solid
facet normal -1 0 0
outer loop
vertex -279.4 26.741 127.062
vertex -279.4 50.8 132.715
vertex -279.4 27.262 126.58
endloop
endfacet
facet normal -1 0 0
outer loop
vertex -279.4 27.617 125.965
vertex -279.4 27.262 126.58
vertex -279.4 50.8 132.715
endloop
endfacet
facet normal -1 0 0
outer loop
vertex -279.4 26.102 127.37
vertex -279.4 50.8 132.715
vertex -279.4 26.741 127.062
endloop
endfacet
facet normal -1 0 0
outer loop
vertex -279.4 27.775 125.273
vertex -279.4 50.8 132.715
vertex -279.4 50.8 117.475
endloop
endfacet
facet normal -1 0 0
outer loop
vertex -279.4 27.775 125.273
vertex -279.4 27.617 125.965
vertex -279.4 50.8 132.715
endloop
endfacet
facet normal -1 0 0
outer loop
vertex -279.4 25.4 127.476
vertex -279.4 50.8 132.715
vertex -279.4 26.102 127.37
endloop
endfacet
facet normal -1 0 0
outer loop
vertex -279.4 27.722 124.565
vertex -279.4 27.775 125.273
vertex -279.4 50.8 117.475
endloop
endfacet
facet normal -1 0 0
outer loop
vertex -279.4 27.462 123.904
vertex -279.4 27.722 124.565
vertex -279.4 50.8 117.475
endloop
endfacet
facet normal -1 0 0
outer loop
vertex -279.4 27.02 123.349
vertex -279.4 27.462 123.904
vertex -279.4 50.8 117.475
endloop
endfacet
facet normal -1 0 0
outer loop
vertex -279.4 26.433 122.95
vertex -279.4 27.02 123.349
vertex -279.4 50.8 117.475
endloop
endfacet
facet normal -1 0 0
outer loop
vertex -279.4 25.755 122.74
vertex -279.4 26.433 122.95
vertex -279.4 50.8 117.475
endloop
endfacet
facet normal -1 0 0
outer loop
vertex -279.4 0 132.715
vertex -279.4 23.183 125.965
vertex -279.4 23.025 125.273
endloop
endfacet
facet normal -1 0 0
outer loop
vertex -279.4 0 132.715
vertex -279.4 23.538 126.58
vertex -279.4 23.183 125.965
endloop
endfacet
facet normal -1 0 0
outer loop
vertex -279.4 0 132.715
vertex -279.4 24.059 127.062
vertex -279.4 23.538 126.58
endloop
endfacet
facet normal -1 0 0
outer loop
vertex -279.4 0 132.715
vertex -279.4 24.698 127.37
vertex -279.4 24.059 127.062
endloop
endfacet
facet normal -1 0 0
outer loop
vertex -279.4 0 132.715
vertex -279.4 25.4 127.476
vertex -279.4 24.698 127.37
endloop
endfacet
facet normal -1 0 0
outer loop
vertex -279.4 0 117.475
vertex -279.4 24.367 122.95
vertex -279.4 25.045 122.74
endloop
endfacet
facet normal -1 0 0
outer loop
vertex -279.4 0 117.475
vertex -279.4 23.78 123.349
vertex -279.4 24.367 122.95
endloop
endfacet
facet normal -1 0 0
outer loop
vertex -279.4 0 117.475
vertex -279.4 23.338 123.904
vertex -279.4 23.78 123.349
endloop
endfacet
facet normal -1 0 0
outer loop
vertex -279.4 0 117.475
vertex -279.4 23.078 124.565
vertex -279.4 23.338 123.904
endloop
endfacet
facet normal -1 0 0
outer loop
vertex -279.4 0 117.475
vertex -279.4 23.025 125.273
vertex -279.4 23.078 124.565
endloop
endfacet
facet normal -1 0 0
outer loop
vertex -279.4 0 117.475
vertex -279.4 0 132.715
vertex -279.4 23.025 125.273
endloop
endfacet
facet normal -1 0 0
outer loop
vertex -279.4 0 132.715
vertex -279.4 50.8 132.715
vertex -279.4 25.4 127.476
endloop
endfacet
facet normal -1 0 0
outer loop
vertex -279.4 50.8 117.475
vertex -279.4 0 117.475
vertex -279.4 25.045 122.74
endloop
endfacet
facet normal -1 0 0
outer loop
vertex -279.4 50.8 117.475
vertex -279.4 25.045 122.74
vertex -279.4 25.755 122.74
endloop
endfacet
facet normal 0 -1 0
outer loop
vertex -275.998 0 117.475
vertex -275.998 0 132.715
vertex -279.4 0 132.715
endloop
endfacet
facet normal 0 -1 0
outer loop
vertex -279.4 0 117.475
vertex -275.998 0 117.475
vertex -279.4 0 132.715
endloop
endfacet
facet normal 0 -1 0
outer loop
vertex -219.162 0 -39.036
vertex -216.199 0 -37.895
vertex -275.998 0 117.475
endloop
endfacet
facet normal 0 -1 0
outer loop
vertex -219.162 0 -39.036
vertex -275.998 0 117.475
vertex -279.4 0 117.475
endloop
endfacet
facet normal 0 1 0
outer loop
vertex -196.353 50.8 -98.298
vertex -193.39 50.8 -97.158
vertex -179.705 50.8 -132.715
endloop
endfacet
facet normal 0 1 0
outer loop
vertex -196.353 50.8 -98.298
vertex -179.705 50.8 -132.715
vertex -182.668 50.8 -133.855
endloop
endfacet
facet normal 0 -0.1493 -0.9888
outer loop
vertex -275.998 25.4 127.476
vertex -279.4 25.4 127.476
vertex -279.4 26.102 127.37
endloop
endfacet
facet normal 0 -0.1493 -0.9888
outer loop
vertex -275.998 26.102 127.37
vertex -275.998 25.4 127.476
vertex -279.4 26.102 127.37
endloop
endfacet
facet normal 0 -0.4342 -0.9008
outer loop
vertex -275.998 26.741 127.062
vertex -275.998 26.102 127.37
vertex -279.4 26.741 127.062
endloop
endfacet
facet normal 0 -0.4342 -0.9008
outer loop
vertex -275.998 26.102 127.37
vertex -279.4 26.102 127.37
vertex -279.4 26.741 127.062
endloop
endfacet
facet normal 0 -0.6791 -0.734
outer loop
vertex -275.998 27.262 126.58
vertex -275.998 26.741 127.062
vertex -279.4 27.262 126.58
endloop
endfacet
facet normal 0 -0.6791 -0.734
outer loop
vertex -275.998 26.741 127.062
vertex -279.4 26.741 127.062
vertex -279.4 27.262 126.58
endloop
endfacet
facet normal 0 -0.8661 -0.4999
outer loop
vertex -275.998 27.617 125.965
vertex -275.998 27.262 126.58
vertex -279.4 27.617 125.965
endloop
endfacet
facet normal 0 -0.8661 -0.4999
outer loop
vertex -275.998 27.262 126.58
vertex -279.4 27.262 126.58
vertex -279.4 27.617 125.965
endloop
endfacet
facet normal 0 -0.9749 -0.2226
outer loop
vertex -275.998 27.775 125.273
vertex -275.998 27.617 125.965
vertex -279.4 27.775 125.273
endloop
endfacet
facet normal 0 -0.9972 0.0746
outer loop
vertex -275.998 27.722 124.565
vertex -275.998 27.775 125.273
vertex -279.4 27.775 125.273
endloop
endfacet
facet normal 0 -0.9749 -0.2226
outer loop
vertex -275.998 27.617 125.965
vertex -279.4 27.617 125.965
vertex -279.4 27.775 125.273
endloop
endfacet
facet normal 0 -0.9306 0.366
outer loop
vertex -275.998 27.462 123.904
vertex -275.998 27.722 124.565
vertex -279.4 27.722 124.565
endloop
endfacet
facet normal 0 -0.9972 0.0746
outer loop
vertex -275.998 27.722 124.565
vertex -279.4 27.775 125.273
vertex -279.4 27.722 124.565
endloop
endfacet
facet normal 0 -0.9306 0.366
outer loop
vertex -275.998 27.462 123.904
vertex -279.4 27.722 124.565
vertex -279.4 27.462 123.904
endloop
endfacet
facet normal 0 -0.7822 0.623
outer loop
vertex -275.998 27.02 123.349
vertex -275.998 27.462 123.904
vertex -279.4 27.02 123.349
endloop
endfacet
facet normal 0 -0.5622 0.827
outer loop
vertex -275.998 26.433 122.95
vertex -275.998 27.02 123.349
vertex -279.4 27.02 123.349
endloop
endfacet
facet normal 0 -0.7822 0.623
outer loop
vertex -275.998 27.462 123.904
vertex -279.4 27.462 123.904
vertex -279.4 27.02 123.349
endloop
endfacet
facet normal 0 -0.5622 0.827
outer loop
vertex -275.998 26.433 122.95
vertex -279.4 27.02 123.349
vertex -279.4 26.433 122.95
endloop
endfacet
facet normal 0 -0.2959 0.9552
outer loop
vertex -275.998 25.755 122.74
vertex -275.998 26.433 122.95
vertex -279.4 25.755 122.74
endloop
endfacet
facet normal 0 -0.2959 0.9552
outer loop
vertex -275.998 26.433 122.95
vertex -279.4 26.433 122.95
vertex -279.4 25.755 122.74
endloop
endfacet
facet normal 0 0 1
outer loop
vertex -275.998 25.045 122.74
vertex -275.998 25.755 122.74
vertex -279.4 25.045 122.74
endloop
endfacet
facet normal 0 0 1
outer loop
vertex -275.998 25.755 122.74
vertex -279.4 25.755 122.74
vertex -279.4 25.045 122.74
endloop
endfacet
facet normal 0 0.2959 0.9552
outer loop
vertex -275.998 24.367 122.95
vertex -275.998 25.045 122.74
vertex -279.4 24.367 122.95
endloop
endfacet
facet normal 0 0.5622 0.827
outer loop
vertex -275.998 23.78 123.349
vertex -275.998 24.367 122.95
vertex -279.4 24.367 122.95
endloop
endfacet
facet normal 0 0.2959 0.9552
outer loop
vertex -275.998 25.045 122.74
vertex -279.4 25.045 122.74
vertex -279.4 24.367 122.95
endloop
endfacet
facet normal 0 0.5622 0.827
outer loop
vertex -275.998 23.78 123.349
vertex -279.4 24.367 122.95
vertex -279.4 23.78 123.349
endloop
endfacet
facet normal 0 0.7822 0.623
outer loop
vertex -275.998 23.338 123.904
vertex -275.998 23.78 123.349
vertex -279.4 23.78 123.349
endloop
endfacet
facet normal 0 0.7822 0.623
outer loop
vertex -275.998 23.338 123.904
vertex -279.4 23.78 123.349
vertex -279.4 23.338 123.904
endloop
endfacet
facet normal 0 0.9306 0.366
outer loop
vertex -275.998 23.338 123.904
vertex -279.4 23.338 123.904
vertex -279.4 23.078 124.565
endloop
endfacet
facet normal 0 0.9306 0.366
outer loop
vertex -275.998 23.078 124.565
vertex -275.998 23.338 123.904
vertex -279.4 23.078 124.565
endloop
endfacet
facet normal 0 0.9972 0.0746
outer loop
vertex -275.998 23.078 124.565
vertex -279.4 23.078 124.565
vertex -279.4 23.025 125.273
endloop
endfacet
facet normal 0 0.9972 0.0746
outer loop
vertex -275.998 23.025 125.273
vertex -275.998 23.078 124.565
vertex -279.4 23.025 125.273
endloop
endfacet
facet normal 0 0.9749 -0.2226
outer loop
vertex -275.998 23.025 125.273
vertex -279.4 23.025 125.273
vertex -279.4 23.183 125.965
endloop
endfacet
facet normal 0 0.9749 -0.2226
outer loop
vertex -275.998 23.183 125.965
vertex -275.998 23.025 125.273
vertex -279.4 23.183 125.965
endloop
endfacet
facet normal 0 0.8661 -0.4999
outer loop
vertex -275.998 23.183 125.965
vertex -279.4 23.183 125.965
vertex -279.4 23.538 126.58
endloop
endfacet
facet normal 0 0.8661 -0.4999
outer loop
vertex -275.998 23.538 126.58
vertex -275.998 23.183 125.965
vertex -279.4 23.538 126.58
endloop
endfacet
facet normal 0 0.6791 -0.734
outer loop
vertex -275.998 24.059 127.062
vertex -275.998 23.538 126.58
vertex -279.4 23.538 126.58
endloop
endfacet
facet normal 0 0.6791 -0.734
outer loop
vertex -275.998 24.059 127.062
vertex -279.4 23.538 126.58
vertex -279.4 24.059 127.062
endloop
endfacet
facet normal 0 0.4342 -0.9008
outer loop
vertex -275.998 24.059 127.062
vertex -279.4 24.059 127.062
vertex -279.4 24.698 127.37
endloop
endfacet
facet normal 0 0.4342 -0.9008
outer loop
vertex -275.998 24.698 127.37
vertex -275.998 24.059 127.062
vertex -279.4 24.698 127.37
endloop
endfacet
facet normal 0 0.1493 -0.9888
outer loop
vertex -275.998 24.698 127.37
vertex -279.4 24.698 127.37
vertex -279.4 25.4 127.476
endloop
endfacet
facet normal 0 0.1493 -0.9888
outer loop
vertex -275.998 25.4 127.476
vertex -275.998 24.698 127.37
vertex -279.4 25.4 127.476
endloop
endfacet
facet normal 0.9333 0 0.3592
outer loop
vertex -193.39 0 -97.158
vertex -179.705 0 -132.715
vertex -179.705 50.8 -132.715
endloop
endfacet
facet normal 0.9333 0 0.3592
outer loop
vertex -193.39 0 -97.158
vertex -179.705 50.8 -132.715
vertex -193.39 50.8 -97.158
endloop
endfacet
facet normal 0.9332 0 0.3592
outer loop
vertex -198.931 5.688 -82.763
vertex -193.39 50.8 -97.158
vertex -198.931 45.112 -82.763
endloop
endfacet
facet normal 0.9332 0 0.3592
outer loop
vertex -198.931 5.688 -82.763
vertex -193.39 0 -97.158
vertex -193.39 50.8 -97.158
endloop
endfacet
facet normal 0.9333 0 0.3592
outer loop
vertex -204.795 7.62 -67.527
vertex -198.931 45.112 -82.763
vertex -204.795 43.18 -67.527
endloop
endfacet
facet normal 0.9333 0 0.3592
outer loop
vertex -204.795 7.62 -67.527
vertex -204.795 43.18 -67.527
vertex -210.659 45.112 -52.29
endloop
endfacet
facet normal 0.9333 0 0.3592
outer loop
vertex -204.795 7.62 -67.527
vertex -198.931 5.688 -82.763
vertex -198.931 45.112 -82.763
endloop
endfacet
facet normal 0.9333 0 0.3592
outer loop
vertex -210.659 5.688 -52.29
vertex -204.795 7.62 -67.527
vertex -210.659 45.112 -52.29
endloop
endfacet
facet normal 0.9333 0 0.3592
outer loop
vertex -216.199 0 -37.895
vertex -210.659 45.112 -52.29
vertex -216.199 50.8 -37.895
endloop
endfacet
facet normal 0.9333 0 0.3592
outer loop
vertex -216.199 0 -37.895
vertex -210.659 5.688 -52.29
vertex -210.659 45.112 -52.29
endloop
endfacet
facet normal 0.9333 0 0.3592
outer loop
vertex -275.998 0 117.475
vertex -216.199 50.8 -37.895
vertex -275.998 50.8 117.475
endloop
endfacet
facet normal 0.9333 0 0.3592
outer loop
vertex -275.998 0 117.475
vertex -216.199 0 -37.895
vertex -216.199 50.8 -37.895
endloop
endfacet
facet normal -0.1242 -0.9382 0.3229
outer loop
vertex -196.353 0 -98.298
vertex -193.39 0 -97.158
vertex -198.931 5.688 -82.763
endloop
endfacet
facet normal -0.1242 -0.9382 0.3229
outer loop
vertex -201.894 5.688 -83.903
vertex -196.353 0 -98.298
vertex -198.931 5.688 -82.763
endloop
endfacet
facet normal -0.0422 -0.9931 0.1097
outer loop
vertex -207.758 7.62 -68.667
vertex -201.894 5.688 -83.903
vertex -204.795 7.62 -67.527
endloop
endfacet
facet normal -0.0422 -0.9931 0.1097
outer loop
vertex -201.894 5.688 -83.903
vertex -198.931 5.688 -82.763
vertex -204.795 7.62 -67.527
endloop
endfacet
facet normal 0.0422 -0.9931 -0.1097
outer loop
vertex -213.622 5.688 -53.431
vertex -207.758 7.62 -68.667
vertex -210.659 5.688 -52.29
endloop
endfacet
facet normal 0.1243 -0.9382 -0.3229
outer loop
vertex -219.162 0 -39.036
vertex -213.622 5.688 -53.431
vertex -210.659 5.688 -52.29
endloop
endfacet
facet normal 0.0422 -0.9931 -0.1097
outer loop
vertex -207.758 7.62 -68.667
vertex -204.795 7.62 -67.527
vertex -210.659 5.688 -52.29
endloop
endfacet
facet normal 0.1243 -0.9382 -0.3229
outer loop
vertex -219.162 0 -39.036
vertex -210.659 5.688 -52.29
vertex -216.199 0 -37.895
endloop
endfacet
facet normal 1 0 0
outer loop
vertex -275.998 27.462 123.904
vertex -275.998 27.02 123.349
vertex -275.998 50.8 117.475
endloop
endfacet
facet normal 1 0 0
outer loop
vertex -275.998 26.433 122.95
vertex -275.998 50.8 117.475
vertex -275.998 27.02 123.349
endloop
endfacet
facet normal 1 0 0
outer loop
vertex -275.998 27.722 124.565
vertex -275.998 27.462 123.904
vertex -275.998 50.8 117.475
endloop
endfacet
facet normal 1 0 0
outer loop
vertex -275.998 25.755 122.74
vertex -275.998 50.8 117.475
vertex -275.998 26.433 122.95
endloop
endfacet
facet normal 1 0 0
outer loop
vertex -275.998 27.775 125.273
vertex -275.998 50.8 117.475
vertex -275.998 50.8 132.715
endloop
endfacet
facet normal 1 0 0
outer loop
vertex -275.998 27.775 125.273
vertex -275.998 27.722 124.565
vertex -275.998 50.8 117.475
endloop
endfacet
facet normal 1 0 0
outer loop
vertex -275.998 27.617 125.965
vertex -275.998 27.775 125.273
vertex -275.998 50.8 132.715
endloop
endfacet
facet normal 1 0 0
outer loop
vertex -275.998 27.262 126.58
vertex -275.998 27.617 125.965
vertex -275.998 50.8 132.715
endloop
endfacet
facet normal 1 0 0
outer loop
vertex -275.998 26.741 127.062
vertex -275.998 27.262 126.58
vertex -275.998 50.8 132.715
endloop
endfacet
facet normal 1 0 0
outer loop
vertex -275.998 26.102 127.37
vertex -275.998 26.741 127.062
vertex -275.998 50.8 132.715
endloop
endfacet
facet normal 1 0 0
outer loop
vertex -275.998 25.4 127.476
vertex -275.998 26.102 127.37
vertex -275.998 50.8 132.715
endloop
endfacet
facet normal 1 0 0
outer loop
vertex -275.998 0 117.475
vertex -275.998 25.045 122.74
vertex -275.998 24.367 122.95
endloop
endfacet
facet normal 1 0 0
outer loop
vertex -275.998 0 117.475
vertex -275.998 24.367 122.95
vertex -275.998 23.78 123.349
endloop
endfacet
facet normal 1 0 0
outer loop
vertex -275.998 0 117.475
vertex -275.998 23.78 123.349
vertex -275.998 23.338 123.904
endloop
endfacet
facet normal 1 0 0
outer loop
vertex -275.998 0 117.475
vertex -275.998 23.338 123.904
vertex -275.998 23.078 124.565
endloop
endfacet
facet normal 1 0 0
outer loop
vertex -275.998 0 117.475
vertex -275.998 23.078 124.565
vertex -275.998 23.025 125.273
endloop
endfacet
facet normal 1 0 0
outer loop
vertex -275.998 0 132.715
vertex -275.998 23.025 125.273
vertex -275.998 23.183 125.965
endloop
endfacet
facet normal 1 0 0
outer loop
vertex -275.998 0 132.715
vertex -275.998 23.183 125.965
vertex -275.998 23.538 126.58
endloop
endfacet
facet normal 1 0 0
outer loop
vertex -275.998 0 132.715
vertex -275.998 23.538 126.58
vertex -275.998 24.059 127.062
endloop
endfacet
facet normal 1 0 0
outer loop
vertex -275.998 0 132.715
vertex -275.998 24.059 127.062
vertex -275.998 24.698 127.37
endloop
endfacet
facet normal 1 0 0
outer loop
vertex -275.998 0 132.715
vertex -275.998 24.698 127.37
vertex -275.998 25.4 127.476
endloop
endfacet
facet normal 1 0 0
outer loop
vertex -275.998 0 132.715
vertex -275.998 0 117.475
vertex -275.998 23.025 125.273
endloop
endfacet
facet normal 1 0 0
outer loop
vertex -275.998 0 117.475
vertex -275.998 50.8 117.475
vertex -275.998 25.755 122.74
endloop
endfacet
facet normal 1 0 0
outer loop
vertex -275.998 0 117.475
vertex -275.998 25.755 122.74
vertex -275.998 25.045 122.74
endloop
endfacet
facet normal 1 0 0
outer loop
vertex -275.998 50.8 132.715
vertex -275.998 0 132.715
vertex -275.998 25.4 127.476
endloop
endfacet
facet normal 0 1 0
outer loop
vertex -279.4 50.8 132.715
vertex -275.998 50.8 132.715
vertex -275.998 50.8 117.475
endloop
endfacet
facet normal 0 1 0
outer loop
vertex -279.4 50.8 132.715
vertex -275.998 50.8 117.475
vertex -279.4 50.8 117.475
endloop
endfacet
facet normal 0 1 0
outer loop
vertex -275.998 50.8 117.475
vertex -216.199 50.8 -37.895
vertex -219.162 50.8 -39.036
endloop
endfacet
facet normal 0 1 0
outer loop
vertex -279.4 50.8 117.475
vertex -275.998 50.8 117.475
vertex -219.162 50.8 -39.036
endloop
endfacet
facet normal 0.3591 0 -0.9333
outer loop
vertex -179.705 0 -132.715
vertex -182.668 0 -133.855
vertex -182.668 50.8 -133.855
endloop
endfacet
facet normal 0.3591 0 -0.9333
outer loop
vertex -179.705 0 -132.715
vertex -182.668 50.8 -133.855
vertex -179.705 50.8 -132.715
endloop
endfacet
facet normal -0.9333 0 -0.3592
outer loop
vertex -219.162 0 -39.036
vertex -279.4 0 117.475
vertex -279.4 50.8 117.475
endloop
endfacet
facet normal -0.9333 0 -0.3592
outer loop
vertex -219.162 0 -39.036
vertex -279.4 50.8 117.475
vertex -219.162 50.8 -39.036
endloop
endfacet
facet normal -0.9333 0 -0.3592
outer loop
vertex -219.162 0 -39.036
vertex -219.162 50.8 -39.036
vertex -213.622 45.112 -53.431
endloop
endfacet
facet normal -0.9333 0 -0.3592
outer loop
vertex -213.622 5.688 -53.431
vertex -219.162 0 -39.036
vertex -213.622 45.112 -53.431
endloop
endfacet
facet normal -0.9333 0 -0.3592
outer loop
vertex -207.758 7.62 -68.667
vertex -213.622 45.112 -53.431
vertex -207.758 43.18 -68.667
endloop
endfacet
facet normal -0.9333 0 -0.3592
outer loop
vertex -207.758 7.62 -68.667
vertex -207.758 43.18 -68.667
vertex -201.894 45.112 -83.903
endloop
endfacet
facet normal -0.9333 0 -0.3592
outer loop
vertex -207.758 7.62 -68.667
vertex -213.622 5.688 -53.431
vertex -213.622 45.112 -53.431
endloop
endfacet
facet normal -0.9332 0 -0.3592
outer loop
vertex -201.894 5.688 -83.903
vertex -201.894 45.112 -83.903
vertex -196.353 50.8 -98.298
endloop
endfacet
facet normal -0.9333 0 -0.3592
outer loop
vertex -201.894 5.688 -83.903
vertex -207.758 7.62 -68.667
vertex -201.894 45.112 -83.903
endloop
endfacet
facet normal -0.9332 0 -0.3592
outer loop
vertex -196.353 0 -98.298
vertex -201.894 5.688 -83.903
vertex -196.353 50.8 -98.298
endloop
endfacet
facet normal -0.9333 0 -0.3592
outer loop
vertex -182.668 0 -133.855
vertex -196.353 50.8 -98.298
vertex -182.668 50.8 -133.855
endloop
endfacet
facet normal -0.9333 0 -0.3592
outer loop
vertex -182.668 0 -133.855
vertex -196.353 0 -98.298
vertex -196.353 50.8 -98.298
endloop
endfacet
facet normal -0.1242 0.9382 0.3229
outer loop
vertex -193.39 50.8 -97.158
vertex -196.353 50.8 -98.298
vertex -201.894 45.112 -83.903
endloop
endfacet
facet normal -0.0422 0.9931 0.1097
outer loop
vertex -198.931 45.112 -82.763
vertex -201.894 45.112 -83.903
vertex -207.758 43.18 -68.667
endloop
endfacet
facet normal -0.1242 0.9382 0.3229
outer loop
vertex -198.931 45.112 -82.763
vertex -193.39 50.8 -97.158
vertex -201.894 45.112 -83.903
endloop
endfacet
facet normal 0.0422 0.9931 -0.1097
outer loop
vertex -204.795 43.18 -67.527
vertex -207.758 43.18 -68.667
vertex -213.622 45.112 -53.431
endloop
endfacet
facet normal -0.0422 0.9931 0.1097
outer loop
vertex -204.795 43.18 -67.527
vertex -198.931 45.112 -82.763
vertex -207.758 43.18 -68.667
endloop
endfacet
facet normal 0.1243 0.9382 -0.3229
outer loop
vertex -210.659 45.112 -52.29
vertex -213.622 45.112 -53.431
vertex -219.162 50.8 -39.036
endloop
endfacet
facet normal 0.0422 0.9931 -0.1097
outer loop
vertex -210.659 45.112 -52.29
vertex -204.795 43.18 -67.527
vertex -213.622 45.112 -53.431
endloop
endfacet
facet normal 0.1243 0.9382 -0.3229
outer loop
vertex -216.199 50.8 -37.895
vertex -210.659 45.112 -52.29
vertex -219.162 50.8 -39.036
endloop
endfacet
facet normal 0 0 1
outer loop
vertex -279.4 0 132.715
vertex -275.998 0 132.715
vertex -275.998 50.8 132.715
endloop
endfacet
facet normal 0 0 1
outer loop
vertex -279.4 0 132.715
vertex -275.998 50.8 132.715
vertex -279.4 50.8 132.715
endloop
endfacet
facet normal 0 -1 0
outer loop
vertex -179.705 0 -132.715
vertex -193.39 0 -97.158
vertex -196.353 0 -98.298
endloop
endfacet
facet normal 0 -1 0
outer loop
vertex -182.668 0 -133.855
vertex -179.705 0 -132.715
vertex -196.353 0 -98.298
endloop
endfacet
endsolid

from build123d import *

# Parameters (mm, degrees)
BOSS_EXTRUDE1_DEPTH     = 50.8
SKETCH2_R               = 2.38125
CUT_EXTRUDE1_DEPTH      = 1
CUT_EXTRUDE1_DEPTH_BACK = 100.695
CUT_EXTRUDE2_DEPTH      = 96.340771022
CUT_EXTRUDE2_DEPTH_BACK = 94.451298519


with BuildPart() as part:
    # Sketch1 → Boss-Extrude1 (new body)
    with BuildSketch(Plane(origin=(0, 0, 0), x_dir=(1, 0, 0), z_dir=(0, 1, 0))):
        Polygon((-279.4, -117.475), (-182.668110184, 133.855439845), (-179.705, 132.715), (-275.9979581, -117.475), (-275.9979581, -132.715), (-279.4, -132.715), align=None)
    extrude(amount=BOSS_EXTRUDE1_DEPTH)

    # Sketch2 → Cut-Extrude1 (cut, two sides)
    with BuildSketch(Plane.ZY.offset(279.4)) as cut_extrude1_sk:
        with Locations((125.095, 25.4)):
            Circle(SKETCH2_R)
    extrude(amount=CUT_EXTRUDE1_DEPTH, mode=Mode.SUBTRACT)
    extrude(cut_extrude1_sk.sketch, amount=-CUT_EXTRUDE1_DEPTH_BACK, mode=Mode.SUBTRACT)

    # Sketch3 → Cut-Extrude2 (cut, two sides)
    with BuildSketch(Plane(origin=(-201.008455978, 0, -77.363998678), x_dir=(0.359193652, 0, -0.93326305), z_dir=(0.93326305, 0, 0.359193652))) as cut_extrude2_sk:
        with BuildLine():
            Line((-42.290889536, 50.8), (21.209110464, 50.8))
            ThreePointArc((21.209110464, 50.8), (-10.540889536, 43.18), (-42.290889536, 50.8))
        make_face()
        with BuildLine():
            Line((-42.290889536, 0), (21.209110464, 0))
            ThreePointArc((21.209110464, 0), (-10.540889536, 7.62), (-42.290889536, 0))
        make_face()
    extrude(amount=CUT_EXTRUDE2_DEPTH, mode=Mode.SUBTRACT)
    extrude(cut_extrude2_sk.sketch, amount=-CUT_EXTRUDE2_DEPTH_BACK, mode=Mode.SUBTRACT)


solid = part.part
